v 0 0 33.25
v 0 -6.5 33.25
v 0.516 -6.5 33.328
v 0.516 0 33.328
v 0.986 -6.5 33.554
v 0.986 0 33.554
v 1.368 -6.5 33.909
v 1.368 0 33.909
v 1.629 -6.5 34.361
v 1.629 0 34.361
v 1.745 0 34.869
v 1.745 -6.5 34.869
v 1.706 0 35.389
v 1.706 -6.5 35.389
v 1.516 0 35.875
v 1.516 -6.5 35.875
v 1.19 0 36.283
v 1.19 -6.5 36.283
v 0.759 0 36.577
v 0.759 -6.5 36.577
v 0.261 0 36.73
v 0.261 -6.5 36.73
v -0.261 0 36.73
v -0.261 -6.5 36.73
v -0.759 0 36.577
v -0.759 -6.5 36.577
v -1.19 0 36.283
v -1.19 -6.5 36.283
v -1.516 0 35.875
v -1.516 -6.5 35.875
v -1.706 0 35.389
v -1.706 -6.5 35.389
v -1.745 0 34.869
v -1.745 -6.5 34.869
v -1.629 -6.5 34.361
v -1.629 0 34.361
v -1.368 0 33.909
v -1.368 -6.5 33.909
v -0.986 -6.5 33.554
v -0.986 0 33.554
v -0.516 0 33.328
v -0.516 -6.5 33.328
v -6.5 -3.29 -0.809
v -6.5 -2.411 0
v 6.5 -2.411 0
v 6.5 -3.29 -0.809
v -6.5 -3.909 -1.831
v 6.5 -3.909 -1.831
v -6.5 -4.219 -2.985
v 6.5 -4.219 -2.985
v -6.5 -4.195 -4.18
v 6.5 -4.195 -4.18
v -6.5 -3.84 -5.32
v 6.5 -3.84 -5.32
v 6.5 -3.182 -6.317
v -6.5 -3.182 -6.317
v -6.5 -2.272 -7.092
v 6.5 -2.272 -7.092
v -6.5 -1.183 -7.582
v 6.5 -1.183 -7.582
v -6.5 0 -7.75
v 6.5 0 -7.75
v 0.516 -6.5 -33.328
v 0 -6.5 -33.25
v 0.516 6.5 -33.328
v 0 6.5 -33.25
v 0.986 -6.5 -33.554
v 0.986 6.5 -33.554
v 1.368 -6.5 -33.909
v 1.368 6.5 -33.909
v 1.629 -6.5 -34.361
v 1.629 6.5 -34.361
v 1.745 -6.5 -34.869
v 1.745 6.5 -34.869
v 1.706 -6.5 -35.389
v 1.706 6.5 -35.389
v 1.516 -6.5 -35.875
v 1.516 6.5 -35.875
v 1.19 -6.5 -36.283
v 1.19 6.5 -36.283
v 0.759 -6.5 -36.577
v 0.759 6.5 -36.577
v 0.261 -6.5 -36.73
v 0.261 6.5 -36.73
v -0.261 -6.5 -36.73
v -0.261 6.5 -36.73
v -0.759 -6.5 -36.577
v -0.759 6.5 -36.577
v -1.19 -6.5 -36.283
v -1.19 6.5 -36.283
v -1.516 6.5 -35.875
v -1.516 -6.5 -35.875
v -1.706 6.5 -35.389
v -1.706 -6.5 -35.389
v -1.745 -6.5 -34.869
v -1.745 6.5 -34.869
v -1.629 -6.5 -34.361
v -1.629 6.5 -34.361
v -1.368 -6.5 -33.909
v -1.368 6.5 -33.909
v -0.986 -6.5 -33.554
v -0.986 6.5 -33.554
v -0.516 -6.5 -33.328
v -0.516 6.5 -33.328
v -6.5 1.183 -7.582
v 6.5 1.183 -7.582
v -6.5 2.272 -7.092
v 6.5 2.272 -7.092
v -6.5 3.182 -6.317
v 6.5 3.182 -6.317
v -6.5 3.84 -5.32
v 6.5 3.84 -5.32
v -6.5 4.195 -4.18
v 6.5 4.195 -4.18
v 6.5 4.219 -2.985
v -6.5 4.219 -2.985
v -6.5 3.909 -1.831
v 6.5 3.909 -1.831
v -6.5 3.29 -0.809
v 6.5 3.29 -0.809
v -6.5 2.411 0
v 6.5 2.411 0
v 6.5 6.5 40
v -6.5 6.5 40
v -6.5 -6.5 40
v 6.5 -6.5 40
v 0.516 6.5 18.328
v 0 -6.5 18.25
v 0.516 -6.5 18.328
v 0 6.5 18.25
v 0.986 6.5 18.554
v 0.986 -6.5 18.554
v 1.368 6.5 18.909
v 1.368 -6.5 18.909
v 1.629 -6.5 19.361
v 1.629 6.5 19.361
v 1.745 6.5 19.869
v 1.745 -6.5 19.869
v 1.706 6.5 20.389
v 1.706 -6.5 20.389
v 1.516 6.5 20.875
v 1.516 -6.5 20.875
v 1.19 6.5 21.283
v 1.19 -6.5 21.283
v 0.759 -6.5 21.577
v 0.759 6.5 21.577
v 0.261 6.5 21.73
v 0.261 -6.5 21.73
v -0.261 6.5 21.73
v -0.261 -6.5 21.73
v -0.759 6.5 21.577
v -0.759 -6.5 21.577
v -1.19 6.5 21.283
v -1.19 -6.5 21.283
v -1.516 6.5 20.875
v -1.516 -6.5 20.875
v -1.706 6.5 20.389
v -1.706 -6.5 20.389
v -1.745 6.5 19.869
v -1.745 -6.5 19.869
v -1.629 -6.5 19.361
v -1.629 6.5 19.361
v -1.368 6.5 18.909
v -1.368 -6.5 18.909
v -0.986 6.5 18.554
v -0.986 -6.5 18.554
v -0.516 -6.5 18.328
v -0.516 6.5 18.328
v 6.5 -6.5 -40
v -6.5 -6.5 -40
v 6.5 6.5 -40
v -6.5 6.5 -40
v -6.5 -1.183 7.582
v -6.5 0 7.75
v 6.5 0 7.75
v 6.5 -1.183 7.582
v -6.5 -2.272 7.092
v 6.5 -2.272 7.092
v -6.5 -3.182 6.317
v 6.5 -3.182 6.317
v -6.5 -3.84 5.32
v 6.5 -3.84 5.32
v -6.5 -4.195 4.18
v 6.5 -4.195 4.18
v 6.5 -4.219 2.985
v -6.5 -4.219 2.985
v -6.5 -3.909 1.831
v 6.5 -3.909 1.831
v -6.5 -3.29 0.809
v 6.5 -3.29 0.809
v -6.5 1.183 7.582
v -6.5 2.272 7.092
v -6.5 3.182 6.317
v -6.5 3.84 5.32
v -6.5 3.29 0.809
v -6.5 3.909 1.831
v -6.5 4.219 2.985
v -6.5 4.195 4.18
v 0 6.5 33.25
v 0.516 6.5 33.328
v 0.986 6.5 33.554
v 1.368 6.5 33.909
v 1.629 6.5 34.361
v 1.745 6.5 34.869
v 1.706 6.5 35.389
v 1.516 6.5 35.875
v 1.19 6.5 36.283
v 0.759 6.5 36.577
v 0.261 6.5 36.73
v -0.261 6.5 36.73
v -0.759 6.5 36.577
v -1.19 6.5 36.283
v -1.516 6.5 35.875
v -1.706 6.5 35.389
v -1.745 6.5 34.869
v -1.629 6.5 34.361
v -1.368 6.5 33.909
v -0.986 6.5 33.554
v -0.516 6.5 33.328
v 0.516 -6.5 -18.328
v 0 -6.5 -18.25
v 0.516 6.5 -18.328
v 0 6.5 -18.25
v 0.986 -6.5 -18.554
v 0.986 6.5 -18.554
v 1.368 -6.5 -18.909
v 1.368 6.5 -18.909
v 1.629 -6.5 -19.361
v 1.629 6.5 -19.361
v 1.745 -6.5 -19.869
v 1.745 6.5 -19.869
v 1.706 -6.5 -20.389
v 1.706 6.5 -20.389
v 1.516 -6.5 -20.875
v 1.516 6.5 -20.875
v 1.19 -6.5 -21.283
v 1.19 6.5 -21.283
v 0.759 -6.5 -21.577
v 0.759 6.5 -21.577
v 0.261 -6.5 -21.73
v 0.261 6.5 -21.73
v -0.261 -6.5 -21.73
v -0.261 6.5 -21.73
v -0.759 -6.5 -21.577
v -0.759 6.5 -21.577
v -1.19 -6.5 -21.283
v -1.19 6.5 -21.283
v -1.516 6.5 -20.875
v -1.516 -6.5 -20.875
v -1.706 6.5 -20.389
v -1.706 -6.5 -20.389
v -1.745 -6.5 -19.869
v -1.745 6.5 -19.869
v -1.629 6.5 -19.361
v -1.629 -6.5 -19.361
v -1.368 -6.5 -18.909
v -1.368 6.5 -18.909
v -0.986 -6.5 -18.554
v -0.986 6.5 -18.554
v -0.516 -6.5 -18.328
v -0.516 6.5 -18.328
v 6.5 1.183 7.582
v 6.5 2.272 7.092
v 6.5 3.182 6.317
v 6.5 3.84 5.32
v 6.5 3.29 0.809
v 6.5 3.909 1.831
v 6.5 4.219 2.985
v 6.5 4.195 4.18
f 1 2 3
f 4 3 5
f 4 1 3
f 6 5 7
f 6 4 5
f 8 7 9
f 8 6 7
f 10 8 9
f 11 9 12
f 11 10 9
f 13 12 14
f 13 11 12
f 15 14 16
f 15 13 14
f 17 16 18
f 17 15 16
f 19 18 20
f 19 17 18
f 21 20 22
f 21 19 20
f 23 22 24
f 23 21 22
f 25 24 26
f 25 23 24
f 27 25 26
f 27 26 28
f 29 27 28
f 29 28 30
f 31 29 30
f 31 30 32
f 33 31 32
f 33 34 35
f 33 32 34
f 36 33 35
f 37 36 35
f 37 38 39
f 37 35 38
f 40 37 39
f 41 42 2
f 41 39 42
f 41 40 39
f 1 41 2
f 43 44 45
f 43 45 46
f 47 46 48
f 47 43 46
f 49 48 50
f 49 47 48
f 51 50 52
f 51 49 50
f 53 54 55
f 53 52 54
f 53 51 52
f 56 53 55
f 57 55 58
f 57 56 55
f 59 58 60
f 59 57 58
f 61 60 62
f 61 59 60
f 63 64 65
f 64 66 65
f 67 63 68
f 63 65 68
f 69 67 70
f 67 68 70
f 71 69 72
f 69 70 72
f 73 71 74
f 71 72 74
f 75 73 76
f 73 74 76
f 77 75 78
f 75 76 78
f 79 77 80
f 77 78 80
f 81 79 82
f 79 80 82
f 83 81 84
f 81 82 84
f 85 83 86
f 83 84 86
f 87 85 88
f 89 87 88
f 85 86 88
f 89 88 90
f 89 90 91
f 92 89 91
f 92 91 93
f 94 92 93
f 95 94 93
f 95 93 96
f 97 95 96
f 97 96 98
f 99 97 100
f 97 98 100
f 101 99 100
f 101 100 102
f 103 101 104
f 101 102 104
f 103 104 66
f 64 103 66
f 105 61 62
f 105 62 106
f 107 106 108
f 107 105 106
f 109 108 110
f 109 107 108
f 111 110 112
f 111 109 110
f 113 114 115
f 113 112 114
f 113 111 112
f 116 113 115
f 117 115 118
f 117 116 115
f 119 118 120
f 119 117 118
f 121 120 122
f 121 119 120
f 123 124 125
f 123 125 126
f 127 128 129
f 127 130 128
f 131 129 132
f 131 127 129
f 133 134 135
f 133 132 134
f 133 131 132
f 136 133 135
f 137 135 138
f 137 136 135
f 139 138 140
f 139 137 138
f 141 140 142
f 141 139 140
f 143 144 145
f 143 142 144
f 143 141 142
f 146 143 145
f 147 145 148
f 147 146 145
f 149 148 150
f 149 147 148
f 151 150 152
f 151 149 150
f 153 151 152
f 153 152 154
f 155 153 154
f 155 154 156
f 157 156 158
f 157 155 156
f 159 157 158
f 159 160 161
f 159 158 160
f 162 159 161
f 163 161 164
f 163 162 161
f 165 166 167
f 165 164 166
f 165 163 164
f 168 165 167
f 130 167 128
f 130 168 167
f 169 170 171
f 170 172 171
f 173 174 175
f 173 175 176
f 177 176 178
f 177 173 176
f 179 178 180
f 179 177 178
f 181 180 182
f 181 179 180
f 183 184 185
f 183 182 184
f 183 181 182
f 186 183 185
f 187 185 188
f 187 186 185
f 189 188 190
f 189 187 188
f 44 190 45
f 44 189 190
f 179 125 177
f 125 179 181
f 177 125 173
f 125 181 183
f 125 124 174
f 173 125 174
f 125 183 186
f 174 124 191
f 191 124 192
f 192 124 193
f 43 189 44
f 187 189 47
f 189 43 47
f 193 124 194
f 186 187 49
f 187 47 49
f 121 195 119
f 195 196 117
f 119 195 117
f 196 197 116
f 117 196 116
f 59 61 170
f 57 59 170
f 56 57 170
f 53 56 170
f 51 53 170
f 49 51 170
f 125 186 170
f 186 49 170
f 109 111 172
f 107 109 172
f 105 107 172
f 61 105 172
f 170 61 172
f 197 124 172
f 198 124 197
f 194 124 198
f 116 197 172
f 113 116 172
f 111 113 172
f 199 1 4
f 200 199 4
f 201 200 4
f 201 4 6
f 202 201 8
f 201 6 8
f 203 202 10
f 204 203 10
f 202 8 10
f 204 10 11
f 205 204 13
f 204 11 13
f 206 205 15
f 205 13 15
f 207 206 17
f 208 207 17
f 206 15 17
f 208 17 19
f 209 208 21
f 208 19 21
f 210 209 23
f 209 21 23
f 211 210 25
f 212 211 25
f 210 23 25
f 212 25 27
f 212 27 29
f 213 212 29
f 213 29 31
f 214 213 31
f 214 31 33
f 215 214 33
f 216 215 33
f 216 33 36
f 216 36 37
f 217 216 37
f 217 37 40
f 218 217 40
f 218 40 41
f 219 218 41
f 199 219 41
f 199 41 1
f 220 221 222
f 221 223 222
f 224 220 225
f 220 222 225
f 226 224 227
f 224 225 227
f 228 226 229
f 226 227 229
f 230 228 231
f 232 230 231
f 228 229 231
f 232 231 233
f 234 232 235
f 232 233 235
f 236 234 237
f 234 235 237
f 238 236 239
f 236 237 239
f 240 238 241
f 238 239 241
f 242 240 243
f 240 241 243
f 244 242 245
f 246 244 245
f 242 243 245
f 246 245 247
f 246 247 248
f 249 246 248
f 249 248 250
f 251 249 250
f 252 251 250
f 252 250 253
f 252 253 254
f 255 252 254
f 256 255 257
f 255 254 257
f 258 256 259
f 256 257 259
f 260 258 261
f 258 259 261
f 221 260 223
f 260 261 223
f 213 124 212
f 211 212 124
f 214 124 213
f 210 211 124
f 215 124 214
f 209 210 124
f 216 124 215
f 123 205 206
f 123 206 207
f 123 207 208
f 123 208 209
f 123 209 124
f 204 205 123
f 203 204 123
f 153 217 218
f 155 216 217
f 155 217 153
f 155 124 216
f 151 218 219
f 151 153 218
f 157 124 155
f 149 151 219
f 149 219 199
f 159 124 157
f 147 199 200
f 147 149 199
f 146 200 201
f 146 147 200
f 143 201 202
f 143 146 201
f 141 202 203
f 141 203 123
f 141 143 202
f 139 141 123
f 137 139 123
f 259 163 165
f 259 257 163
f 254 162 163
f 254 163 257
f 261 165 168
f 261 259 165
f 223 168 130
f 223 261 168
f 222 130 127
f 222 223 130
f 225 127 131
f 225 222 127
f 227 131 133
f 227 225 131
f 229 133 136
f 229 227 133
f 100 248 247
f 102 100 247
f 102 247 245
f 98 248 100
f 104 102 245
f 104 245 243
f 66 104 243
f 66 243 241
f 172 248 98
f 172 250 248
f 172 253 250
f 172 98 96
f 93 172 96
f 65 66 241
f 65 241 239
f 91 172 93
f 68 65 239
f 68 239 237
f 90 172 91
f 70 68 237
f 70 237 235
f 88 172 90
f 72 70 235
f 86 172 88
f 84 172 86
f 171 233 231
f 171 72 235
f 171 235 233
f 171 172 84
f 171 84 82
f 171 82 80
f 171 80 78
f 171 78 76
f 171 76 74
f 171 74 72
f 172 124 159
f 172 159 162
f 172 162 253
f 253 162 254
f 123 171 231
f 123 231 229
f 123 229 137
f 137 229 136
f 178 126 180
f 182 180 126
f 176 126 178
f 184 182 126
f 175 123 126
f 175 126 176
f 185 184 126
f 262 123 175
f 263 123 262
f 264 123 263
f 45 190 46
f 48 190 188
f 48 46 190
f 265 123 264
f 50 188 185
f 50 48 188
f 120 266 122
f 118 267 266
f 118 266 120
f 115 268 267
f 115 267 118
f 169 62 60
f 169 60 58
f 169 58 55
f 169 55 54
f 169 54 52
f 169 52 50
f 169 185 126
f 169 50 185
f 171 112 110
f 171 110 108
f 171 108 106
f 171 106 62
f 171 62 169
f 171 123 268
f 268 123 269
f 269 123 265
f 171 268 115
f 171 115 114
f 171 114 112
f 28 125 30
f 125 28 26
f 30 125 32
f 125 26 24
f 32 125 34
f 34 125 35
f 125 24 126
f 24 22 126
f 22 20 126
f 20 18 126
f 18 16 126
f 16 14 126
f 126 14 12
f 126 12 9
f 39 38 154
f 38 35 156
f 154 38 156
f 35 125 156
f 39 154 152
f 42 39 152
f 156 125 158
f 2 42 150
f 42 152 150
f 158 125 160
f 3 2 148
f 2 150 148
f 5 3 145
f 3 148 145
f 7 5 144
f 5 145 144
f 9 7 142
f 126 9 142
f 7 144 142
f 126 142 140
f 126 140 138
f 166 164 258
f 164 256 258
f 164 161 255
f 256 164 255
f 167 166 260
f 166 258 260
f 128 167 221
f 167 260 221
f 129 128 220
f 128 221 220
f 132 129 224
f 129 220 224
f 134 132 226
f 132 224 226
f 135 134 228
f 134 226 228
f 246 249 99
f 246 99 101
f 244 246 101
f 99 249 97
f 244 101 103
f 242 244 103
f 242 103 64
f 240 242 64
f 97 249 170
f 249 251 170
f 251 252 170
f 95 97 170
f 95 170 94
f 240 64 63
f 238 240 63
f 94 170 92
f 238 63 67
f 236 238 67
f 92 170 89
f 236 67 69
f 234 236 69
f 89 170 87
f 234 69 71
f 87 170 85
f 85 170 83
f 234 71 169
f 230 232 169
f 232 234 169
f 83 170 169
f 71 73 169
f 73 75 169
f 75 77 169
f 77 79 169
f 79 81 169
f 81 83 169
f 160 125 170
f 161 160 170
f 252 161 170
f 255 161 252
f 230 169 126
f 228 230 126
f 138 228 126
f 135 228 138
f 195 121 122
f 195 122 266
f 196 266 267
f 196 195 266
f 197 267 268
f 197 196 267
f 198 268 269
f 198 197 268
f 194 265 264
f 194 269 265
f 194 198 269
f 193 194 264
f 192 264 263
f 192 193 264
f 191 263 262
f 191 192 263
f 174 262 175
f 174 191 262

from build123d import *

# Parameters (mm, degrees)
SKETCH_1_W               = 13
SKETCH_1_H               = 80
EXTRUDE_1_DEPTH          = 6.5
CUT_EXTRUDE_1_DEPTH      = 42.042660732
CUT_EXTRUDE_1_DEPTH_BACK = 42.042660732
SKETCH_4_R               = 1.75
CUT_EXTRUDE_2_DEPTH      = 42.042660732


with BuildPart() as part:
    # 스케치1 → 보스-돌출1 (new, symmetric)
    with BuildSketch(Plane(origin=(0, 0, 0), x_dir=(1, 0, 0), z_dir=(0, 1, 0))):
        Rectangle(SKETCH_1_W, SKETCH_1_H)
    extrude(amount=EXTRUDE_1_DEPTH, both=True)

    # 스케치3 → 컷-돌출1 (cut, two sides: drawn at the far end of the back side and taken through both)
    with BuildSketch(Plane(origin=(0, 0, 0), x_dir=(0, 0, -1), z_dir=(1, 0, 0)).offset(-CUT_EXTRUDE_1_DEPTH_BACK)):
        with BuildLine():
            ThreePointArc((0, 2.41091269), (0.55817077, 1.262438117), (0.75, 0))
            Line((0.75, 0), (7.75, 0))
            ThreePointArc((7.75, 0), (4.762438117, 4.05817077), (0, 2.41091269))
        make_face()
        with BuildLine():
            ThreePointArc((0, -2.41091269), (0.55817077, -1.262438117), (0.75, 0))
            Line((0.75, 0), (-0.75, 0))
            ThreePointArc((-0.75, 0), (-0.55817077, -1.262438117), (0, -2.41091269))
        make_face()
        with BuildLine():
            Line((-0.75, 0), (0.75, 0))
            ThreePointArc((0.75, 0), (0.55817077, 1.262438117), (0, 2.41091269))
            ThreePointArc((0, 2.41091269), (-0.55817077, 1.262438117), (-0.75, 0))
        make_face()
        with BuildLine():
            Line((7.75, 0), (0.75, 0))
            ThreePointArc((0.75, 0), (0.55817077, -1.262438117), (0, -2.41091269))
            ThreePointArc((0, -2.41091269), (4.762438117, -4.05817077), (7.75, 0))
        make_face()
        with BuildLine():
            ThreePointArc((0, -2.41091269), (-0.55817077, -1.262438117), (-0.75, 0))
            Line((-0.75, 0), (-7.75, 0))
            ThreePointArc((-7.75, 0), (-4.762438117, -4.05817077), (0, -2.41091269))
        make_face()
        with BuildLine():
            Line((-7.75, 0), (-0.75, 0))
            ThreePointArc((-0.75, 0), (-0.55817077, 1.262438117), (0, 2.41091269))
            ThreePointArc((0, 2.41091269), (-4.762438117, 4.05817077), (-7.75, 0))
        make_face()
    extrude(amount=CUT_EXTRUDE_1_DEPTH + CUT_EXTRUDE_1_DEPTH_BACK, mode=Mode.SUBTRACT)

    # 스케치4 → 컷-돌출2 (cut, symmetric)
    with BuildSketch(Plane(origin=(0, 0, 0), x_dir=(1, 0, 0), z_dir=(0, 1, 0))):
        with Locations(Location((0, 35, 0), (0, 0, 270))):
            Circle(SKETCH_4_R)
        with Locations(Location((0, 20, 0), (0, 0, 270))):
            Circle(SKETCH_4_R)
    cut_extrude_2 = extrude(amount=CUT_EXTRUDE_2_DEPTH, both=True, mode=Mode.SUBTRACT)

    # 대칭 복사1: 컷-돌출2 across plane
    add(cut_extrude_2.mirror(Plane.XY), mode=Mode.SUBTRACT)


solid = part.part
